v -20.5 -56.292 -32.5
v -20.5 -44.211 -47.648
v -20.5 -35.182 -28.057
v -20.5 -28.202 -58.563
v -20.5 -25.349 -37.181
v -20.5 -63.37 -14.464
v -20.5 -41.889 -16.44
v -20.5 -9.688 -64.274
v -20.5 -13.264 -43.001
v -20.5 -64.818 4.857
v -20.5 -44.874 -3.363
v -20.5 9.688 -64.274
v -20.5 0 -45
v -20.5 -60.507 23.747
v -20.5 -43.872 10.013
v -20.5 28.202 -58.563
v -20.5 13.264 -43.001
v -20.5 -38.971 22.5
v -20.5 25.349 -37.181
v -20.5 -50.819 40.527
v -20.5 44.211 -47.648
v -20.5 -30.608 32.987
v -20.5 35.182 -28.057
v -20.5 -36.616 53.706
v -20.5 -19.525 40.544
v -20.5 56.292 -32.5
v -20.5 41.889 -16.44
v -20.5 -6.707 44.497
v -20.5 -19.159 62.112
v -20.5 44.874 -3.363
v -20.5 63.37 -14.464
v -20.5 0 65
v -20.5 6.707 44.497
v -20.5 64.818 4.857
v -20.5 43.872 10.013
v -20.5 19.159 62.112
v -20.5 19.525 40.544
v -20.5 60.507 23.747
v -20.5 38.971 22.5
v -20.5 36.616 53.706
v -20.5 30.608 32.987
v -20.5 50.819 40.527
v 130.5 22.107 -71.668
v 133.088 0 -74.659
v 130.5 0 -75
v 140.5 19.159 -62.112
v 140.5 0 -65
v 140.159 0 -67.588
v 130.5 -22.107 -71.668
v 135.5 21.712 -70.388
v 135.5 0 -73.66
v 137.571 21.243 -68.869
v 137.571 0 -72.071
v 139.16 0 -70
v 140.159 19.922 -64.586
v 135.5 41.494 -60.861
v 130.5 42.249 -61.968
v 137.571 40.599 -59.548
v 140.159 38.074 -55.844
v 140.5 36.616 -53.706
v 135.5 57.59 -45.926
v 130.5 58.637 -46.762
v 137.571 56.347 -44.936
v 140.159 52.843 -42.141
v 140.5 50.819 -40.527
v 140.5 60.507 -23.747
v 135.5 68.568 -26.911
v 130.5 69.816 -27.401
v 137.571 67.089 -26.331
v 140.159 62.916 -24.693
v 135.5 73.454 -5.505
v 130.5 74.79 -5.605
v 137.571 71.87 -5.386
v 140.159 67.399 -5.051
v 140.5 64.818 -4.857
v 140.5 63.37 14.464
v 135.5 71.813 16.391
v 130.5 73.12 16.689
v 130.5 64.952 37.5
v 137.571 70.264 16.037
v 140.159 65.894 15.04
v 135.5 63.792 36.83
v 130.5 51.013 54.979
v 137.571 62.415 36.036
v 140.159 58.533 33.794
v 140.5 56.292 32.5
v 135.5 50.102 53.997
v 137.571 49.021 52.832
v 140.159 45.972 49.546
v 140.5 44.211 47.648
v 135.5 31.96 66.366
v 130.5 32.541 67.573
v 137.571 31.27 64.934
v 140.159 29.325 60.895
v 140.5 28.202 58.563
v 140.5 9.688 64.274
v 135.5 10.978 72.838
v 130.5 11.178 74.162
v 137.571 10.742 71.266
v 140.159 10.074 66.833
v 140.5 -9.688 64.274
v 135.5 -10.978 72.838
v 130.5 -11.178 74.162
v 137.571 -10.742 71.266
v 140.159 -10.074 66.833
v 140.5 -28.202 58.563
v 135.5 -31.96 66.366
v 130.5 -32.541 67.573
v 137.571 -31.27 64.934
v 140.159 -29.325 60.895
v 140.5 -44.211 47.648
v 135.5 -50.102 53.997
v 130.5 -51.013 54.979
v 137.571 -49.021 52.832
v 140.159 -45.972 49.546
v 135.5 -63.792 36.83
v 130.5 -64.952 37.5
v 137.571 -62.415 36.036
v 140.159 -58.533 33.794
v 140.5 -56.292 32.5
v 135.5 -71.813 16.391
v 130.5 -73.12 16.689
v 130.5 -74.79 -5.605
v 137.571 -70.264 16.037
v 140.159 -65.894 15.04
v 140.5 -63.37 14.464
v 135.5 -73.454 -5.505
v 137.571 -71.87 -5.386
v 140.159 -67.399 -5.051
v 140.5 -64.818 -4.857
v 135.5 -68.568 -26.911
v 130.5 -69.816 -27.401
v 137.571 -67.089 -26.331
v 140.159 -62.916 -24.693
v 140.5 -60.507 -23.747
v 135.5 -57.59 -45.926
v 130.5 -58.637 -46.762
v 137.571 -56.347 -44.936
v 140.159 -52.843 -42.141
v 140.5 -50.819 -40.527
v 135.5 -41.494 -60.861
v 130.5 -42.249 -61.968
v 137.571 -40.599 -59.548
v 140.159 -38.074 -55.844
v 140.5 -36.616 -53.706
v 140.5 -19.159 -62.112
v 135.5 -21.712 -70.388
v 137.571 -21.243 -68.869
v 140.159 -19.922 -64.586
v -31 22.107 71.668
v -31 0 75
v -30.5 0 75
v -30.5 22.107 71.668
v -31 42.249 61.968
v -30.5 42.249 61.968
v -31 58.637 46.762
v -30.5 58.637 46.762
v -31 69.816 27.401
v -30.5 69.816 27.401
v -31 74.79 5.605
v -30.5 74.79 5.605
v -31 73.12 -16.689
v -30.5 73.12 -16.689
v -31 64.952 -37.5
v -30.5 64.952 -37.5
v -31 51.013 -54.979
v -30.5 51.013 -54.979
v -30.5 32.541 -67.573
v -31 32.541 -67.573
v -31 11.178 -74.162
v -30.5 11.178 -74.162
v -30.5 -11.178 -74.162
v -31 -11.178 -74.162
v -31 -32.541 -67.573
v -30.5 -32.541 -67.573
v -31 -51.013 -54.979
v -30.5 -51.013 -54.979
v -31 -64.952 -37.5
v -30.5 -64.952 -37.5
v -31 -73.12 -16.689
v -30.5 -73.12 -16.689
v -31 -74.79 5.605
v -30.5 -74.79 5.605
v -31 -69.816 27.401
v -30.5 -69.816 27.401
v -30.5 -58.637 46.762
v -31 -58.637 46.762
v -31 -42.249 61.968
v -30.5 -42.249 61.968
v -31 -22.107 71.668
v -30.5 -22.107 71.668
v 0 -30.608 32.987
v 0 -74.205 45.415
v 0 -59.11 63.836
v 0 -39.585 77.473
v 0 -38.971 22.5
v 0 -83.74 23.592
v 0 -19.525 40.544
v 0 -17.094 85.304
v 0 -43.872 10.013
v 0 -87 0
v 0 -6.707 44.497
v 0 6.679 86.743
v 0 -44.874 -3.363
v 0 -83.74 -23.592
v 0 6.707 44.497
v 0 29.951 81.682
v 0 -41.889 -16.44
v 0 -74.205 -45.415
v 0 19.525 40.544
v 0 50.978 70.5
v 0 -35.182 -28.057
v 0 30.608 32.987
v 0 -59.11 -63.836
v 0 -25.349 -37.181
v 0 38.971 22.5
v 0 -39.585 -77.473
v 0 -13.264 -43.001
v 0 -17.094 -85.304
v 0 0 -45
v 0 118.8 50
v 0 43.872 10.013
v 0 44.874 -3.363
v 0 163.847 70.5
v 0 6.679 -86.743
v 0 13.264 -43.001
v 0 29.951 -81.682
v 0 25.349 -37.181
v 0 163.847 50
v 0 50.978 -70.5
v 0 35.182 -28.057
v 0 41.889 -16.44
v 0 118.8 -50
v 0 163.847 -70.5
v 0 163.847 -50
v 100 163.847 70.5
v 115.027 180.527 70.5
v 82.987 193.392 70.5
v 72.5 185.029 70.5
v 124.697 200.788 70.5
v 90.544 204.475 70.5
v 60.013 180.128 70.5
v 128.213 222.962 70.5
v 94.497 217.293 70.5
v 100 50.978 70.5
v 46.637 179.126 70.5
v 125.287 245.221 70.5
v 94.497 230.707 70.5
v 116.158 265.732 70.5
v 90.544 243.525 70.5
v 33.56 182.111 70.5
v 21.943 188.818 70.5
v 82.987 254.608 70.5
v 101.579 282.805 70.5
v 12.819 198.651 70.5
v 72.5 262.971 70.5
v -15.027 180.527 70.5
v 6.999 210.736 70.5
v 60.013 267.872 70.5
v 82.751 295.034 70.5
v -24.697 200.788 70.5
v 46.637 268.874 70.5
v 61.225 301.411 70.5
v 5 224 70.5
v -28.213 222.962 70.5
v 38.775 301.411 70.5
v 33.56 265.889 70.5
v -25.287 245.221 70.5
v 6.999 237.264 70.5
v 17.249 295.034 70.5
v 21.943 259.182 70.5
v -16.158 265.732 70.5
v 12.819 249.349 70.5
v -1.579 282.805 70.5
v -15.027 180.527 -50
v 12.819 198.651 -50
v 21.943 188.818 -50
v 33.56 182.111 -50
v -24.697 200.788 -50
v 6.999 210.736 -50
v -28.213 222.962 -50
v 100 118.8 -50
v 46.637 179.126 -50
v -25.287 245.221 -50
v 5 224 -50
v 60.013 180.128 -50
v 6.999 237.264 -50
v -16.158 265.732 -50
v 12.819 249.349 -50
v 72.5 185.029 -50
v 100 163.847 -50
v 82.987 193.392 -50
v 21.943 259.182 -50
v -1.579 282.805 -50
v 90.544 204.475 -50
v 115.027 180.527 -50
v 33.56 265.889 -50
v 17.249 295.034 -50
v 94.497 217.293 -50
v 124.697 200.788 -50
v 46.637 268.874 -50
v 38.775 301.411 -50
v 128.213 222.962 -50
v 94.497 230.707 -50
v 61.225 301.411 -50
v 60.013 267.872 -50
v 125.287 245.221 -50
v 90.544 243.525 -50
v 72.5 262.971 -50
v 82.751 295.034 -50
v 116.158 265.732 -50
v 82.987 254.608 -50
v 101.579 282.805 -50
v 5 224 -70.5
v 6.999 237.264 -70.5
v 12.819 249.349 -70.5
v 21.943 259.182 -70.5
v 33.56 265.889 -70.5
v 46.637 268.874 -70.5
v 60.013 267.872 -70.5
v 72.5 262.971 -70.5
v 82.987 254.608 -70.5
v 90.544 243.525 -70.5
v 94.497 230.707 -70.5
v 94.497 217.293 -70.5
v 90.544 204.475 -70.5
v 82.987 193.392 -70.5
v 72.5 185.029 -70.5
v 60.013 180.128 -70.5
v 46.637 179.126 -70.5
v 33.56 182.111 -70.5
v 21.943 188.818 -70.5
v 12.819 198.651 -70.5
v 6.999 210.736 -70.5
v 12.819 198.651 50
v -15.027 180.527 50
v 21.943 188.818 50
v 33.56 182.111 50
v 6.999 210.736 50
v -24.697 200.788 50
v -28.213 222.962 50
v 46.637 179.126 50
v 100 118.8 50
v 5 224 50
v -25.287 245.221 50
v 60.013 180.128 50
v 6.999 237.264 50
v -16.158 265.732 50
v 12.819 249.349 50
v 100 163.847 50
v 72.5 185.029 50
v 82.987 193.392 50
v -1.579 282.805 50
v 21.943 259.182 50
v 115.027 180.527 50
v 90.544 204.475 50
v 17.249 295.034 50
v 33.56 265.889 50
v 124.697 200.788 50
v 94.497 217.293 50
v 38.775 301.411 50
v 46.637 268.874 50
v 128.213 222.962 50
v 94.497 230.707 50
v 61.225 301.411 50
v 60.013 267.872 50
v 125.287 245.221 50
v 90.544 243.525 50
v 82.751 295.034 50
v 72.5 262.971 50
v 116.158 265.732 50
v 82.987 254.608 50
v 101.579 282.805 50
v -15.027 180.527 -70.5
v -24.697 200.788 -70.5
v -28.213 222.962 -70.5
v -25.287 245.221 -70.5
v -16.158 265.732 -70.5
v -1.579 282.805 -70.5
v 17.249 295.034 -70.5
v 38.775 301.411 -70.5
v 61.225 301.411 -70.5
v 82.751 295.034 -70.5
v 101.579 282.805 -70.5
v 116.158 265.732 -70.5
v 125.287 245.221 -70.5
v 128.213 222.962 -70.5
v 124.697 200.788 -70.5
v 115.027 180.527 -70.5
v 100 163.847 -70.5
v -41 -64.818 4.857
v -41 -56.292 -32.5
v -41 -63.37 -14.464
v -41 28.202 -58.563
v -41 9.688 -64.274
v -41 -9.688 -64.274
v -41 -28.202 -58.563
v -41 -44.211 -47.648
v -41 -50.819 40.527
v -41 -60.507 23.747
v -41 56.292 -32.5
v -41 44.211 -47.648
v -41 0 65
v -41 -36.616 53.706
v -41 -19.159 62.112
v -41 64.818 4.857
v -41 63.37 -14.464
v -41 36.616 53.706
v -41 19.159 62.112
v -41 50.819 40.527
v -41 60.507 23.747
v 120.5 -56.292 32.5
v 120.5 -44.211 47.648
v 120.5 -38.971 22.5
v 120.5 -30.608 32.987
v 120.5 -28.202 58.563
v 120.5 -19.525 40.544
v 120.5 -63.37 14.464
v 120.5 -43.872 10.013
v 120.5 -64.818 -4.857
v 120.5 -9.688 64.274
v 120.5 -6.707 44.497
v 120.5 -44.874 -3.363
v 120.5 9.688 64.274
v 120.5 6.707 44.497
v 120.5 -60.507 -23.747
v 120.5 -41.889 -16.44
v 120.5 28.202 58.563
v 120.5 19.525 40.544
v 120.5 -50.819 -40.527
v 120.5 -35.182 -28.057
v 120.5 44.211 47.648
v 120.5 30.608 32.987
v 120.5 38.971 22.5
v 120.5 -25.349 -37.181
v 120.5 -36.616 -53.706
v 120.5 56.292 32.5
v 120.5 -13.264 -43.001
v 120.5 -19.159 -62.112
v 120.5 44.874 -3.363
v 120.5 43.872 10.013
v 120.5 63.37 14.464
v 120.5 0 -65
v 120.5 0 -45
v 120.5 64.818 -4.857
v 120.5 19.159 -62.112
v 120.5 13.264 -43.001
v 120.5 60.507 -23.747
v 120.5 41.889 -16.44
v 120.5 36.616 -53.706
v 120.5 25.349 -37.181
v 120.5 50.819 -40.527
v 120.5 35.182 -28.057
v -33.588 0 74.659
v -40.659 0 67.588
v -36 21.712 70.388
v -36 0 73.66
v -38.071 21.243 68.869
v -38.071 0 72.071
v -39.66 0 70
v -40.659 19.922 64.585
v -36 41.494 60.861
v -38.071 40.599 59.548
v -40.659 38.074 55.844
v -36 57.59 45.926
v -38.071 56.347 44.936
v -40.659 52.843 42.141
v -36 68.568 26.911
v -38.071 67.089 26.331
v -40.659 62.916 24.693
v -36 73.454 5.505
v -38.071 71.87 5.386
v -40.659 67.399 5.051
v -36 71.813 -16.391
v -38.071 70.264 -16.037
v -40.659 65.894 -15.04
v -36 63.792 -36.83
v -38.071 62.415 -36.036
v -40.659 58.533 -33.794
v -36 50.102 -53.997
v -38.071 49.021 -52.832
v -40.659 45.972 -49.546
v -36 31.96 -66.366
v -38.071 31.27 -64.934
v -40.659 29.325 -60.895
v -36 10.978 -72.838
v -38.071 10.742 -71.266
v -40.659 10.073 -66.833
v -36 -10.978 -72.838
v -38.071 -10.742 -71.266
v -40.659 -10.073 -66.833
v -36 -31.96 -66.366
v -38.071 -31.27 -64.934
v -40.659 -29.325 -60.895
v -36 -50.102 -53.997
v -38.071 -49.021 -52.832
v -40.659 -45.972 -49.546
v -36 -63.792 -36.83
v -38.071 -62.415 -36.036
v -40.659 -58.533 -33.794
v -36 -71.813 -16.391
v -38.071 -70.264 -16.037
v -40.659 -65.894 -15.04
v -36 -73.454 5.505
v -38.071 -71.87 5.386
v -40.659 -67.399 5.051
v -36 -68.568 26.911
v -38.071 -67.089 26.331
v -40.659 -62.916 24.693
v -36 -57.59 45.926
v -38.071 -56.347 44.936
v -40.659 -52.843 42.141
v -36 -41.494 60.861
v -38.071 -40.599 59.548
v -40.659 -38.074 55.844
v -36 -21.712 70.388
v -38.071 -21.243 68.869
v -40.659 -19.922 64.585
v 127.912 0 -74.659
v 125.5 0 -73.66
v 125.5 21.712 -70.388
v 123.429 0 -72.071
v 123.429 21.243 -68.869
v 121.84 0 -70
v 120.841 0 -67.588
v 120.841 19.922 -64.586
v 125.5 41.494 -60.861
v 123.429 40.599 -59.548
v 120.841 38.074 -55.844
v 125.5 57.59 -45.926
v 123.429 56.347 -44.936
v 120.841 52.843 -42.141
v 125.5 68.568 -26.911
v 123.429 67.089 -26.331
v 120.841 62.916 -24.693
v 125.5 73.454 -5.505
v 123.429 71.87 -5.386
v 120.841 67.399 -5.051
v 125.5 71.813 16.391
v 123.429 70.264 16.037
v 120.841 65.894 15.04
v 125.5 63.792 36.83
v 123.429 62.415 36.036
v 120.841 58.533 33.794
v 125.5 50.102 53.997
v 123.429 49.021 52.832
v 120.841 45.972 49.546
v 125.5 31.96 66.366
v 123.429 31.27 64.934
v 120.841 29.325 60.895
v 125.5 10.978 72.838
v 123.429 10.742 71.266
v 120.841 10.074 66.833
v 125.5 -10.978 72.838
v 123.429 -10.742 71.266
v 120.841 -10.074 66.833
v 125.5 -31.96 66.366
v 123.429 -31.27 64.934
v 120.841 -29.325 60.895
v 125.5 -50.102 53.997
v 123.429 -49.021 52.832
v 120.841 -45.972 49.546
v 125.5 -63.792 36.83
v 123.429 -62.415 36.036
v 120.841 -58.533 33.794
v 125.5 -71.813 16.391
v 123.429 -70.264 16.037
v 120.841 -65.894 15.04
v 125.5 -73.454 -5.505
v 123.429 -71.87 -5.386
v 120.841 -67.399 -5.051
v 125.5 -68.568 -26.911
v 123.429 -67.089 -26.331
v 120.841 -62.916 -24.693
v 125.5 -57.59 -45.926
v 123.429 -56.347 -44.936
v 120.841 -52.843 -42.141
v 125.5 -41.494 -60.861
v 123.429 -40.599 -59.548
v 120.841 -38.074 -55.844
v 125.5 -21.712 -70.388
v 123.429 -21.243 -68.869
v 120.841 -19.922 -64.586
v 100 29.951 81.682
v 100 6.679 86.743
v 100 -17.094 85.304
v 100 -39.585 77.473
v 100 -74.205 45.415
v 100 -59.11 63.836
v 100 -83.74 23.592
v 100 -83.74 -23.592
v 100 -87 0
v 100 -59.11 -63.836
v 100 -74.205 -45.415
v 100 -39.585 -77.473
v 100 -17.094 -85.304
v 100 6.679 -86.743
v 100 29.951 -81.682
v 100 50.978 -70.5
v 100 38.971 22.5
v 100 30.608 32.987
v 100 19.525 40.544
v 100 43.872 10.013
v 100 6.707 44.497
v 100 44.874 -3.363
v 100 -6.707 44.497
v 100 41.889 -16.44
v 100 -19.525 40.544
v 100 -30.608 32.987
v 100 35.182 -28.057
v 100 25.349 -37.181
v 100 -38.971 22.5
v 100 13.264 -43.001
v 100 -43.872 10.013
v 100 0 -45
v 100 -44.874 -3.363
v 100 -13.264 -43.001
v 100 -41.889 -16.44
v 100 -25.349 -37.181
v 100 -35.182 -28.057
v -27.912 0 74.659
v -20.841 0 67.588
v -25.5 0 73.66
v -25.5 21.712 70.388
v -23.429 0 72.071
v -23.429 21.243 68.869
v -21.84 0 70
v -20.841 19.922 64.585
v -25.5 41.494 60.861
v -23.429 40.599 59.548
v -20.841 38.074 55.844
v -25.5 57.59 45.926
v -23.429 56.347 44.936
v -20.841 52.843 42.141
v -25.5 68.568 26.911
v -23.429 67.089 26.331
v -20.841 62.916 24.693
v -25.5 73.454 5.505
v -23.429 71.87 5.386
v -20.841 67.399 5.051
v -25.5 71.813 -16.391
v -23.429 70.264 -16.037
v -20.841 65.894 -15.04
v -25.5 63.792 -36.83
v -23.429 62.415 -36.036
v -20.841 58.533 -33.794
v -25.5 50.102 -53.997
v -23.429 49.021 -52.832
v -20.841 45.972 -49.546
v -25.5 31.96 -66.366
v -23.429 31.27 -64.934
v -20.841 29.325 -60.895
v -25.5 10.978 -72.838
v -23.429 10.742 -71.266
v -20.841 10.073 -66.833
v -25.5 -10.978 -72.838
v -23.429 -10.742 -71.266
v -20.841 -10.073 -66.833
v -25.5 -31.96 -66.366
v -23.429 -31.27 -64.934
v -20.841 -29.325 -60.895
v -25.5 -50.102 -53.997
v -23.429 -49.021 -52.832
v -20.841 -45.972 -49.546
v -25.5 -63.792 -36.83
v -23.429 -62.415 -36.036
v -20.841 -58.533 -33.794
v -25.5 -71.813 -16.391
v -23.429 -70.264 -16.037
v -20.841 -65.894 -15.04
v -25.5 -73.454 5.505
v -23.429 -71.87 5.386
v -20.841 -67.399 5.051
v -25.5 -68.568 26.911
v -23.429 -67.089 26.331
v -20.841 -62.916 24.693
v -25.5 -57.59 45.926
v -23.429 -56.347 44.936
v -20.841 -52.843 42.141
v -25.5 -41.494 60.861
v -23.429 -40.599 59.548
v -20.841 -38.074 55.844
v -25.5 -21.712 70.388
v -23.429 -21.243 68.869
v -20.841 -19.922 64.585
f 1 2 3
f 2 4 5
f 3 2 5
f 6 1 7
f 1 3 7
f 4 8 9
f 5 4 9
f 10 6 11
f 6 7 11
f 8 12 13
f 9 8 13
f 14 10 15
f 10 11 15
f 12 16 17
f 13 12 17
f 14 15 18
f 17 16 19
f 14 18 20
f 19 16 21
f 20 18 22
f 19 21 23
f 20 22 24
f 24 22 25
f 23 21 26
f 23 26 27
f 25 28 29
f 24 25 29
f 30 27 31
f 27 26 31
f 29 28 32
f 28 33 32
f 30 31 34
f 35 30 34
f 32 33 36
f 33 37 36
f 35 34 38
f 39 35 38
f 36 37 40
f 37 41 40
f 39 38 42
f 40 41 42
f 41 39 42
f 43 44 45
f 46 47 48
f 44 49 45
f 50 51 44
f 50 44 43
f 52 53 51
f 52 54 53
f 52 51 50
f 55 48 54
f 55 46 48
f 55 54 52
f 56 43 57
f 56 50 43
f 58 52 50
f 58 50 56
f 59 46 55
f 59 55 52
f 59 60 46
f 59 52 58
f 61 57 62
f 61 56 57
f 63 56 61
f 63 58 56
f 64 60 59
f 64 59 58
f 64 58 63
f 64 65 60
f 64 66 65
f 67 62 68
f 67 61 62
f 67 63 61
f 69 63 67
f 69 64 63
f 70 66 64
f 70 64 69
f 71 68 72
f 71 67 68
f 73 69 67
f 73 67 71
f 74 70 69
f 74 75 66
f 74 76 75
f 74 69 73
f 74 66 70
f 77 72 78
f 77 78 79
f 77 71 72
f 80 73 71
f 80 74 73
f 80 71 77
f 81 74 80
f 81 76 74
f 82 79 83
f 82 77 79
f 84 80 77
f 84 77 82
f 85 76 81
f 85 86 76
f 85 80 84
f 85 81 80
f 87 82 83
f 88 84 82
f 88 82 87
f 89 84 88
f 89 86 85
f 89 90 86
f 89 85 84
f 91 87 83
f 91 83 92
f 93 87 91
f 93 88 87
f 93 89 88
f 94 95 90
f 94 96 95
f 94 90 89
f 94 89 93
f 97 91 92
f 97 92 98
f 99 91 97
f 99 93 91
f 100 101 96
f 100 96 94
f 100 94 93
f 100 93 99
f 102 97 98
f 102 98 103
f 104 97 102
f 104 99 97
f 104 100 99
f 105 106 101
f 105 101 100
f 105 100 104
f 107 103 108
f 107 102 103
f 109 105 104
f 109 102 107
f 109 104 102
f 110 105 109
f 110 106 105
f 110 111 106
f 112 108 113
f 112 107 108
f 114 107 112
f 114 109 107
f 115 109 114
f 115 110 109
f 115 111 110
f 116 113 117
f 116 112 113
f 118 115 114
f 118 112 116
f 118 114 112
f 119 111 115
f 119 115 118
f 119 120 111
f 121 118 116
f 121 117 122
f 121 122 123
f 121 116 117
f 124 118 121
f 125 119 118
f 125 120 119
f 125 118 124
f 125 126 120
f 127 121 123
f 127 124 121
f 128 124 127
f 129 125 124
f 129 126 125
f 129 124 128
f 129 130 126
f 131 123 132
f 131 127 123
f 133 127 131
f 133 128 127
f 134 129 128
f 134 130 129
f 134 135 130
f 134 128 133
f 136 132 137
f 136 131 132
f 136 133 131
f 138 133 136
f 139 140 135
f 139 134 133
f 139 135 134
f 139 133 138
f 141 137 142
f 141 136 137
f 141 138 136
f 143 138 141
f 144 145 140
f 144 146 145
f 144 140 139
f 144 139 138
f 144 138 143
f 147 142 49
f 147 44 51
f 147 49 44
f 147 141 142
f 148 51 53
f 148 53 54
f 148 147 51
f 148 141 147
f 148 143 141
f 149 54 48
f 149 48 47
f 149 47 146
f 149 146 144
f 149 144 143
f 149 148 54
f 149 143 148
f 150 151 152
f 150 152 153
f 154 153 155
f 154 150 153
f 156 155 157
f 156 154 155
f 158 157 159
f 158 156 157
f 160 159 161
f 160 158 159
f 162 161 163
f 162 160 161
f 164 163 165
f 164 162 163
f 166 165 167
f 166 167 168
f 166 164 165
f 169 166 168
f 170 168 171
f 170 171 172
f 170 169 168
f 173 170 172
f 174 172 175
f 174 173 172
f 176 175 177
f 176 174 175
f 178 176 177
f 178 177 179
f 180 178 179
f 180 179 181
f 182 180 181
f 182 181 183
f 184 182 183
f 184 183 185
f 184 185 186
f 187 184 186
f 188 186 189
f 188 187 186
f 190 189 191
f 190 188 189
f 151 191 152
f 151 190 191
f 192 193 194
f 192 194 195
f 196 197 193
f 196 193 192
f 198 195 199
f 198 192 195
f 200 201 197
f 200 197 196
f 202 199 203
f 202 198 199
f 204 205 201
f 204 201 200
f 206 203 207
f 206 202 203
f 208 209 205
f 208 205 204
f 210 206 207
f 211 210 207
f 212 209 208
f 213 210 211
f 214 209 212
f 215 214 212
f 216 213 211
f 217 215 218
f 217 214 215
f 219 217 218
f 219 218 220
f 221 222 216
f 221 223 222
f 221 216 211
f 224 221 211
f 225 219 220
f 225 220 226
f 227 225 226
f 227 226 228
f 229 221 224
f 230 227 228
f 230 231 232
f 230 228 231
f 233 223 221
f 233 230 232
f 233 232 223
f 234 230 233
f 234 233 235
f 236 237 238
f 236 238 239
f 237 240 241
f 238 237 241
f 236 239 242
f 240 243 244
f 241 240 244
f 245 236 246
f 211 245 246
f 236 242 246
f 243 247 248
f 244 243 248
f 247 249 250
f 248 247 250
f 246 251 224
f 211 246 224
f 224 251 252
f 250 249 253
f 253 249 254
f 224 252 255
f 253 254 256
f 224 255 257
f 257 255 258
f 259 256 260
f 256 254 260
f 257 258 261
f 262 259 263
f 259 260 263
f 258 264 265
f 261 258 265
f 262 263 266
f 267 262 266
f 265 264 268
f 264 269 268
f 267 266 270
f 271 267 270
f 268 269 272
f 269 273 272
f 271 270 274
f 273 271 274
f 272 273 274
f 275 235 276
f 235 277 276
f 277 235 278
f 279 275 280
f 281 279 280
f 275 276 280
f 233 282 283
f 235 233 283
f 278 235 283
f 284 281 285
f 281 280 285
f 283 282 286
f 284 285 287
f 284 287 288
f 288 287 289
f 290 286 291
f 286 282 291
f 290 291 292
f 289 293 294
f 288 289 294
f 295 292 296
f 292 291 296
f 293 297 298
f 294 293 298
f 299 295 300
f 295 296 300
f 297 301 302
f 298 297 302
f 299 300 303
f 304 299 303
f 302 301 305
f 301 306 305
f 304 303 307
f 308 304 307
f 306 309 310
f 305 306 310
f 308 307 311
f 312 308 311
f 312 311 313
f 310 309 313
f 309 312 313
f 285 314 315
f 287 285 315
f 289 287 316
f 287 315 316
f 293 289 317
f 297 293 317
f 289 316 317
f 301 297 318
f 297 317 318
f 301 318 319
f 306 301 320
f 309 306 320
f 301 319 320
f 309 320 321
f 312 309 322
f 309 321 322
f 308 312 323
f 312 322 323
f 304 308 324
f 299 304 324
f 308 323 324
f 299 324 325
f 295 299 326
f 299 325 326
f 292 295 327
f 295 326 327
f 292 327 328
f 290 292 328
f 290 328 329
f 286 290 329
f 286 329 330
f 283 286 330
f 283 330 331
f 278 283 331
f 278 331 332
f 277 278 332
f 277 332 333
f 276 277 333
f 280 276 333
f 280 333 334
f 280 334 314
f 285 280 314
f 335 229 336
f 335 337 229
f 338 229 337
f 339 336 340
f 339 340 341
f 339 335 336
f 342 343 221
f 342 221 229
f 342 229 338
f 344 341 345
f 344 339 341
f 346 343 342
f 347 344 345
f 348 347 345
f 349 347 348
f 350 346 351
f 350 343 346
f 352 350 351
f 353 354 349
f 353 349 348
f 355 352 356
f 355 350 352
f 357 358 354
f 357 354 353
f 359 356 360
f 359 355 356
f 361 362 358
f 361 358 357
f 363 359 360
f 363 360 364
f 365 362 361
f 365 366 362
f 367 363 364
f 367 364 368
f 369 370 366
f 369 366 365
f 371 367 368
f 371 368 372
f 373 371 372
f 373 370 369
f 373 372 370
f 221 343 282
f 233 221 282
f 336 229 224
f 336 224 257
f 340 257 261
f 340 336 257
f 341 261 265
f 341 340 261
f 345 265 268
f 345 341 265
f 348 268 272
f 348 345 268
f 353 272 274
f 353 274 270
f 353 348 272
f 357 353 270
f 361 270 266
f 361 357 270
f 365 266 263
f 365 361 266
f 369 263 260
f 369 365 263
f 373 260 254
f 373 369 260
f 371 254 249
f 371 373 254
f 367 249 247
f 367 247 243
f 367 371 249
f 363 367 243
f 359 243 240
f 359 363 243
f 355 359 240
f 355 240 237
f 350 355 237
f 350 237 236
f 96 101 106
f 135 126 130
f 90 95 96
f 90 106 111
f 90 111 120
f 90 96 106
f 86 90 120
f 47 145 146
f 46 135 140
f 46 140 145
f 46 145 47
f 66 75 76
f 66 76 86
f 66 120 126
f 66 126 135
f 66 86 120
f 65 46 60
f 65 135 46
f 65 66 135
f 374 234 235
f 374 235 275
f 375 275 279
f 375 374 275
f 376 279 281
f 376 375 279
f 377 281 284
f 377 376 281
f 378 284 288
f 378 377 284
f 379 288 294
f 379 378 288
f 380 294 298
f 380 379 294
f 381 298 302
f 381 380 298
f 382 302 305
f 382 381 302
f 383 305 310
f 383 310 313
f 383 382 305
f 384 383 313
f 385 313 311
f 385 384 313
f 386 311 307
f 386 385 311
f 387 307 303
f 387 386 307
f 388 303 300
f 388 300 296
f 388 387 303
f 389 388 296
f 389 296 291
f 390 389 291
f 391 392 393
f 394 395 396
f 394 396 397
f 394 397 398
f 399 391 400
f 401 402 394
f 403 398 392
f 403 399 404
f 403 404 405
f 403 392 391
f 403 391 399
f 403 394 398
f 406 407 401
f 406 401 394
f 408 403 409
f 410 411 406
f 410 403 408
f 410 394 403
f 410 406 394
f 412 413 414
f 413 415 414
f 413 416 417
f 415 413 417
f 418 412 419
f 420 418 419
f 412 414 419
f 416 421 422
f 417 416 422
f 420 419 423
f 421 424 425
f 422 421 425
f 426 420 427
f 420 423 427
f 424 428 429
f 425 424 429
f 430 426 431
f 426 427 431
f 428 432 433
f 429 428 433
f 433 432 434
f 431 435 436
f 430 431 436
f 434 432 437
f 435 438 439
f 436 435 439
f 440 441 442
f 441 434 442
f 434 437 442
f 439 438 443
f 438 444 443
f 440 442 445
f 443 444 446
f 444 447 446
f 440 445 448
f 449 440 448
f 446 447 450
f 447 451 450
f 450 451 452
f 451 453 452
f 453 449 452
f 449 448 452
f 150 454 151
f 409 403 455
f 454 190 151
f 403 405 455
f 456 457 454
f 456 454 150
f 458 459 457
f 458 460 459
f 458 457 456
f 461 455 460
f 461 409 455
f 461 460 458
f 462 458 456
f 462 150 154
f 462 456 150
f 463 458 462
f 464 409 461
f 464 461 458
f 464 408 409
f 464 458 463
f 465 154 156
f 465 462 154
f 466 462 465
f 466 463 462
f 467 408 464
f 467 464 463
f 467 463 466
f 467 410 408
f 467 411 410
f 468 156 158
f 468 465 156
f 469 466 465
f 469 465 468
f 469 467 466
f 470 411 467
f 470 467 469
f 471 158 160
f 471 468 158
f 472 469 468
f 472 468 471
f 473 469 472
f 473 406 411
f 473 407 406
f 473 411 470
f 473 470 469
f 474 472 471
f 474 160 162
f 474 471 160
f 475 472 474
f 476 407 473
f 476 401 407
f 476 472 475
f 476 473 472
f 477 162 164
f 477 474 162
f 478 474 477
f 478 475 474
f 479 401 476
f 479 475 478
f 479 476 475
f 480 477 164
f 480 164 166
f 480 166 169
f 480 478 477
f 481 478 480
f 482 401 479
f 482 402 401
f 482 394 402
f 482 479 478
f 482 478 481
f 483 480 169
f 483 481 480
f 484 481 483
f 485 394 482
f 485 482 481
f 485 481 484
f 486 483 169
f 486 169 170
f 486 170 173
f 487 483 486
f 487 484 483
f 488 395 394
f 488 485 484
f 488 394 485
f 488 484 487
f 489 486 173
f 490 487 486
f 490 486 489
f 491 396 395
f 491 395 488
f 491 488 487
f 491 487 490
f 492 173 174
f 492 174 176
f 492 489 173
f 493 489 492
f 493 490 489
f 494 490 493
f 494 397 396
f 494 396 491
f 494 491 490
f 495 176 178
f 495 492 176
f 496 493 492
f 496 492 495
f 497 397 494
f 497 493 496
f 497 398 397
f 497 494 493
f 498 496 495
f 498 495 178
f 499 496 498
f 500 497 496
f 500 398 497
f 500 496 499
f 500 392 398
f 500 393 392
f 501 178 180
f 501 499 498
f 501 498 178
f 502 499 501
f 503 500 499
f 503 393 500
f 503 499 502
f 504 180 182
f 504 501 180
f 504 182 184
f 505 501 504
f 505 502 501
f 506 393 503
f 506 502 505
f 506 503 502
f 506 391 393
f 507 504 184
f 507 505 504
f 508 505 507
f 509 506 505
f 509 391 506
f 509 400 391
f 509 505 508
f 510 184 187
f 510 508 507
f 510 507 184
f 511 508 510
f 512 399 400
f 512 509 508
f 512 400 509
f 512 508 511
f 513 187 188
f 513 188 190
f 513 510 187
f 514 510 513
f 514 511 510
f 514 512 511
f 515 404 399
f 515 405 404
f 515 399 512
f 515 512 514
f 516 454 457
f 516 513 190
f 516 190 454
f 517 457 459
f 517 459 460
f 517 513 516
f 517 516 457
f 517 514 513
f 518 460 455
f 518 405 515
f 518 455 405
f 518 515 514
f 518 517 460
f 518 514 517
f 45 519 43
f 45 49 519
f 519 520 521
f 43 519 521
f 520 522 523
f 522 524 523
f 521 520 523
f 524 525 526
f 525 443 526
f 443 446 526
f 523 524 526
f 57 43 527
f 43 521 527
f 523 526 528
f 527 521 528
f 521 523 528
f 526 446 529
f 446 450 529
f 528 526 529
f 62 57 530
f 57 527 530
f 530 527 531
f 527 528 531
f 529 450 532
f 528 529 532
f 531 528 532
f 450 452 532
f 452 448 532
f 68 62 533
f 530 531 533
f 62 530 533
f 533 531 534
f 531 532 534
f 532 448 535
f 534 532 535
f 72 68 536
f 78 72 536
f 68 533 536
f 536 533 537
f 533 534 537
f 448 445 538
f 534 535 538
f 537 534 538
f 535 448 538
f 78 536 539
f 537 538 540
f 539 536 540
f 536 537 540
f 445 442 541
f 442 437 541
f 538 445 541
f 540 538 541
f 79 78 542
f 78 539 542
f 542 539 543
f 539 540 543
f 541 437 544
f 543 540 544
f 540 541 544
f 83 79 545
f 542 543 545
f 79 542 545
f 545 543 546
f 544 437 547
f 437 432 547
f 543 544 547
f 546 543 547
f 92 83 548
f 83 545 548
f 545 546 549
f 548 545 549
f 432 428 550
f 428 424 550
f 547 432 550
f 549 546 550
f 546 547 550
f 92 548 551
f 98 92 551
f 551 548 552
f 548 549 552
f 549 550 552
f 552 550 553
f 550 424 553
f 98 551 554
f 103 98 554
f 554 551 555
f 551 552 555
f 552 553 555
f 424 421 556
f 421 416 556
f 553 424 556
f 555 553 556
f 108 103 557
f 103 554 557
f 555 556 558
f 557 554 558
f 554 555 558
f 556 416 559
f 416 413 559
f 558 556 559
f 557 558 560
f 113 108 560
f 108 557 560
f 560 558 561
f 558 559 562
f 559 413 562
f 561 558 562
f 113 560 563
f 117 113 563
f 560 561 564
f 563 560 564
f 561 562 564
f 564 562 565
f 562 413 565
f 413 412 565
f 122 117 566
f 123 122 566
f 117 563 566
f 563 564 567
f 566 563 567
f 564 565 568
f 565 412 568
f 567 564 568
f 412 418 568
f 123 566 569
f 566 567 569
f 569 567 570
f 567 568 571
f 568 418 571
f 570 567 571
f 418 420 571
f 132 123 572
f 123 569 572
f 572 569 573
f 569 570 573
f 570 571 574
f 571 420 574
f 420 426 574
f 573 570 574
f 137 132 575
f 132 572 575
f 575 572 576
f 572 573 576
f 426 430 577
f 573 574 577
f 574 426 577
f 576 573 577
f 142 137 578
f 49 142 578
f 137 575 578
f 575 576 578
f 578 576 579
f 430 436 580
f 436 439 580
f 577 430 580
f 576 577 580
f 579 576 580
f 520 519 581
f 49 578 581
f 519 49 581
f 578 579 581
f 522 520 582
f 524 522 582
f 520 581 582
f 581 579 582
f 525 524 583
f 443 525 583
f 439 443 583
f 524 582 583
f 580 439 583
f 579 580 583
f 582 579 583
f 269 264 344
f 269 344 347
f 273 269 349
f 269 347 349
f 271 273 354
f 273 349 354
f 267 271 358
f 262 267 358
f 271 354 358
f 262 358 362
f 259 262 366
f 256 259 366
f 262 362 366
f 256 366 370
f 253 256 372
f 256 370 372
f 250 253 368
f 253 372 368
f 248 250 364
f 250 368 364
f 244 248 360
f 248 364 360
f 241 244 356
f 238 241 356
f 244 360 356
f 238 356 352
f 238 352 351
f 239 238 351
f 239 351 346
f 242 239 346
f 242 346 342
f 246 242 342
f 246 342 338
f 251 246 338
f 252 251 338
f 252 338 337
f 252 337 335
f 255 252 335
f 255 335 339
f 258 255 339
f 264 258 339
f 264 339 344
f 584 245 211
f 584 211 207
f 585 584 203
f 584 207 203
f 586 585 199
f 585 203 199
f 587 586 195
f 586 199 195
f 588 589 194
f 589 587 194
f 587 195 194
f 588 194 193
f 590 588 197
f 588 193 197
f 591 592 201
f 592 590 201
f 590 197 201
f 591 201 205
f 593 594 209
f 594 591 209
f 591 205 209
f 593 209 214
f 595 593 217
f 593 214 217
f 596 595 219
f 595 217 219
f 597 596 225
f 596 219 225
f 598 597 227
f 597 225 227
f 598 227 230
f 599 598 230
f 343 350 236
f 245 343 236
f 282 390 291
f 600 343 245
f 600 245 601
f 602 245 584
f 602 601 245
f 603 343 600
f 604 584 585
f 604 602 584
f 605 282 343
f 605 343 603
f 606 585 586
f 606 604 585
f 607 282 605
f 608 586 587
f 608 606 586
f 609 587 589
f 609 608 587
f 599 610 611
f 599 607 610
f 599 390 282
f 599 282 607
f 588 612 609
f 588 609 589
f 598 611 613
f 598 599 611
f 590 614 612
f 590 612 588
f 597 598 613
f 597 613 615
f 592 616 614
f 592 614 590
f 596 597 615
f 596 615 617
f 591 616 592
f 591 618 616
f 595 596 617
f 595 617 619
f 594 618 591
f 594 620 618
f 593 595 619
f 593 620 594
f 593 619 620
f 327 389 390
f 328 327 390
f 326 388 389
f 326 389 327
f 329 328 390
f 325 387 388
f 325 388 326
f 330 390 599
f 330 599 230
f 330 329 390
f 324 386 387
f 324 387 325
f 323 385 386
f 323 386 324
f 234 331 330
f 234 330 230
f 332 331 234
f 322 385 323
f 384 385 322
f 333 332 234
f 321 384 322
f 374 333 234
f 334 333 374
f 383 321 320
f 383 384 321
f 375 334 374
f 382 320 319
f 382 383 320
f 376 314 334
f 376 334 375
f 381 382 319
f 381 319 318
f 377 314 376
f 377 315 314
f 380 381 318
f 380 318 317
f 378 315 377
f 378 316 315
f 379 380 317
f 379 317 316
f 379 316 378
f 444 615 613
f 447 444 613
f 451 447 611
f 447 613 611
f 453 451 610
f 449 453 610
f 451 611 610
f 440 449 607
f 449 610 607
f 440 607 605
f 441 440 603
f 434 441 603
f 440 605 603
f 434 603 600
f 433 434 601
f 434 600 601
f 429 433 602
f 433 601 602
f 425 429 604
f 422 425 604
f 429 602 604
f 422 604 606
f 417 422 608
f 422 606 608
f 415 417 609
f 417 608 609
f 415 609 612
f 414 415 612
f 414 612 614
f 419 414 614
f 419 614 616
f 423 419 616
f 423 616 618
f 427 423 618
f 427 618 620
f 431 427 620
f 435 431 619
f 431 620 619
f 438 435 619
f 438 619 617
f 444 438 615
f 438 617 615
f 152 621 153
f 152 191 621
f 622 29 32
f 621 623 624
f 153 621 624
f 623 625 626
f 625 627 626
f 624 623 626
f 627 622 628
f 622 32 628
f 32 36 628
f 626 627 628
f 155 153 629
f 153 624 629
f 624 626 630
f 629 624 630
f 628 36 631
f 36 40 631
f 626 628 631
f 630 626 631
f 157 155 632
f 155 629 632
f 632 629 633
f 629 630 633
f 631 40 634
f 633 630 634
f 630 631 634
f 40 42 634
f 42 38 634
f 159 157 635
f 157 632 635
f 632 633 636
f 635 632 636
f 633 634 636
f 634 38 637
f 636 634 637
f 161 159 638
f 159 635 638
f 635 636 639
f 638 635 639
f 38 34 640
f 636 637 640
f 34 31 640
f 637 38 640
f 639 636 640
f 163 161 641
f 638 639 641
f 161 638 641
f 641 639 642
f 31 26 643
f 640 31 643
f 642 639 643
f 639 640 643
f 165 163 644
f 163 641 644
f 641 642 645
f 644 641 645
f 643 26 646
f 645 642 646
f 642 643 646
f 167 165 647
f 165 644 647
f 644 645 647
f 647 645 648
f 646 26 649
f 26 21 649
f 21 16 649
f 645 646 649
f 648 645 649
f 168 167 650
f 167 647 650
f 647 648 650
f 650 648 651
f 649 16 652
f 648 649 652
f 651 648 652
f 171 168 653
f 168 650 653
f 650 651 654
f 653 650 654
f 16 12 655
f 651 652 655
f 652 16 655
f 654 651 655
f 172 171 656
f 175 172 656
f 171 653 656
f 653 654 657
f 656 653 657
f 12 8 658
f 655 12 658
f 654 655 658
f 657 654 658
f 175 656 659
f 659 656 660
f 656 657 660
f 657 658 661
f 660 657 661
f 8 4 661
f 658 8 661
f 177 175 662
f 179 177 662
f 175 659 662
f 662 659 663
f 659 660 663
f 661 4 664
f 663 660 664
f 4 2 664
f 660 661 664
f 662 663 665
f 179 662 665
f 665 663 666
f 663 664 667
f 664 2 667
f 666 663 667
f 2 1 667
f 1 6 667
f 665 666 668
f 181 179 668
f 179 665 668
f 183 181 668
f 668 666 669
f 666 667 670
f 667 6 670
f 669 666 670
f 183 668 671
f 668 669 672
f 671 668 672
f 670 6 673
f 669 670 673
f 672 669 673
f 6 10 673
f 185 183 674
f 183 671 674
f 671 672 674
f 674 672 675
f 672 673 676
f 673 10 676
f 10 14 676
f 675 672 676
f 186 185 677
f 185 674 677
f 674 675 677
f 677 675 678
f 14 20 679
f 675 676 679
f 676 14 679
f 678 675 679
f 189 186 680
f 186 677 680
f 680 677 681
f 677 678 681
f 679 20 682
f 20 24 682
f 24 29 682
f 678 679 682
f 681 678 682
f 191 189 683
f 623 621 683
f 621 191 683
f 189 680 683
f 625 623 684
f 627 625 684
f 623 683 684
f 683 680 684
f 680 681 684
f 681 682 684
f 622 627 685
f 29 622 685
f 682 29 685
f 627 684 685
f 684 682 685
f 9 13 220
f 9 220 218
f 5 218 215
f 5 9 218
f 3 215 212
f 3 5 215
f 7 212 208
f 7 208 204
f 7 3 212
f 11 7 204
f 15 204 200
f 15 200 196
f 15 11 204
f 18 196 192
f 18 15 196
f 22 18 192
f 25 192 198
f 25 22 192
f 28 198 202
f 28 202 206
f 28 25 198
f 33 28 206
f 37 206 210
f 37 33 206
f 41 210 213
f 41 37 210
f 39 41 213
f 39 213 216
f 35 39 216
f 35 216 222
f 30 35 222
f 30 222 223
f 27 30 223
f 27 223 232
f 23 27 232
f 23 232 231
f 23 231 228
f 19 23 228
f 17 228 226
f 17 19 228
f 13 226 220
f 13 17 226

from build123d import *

# Parameters (mm, degrees)
SKETCH1_R                = 87
BOSS_EXTRUDE3_DEPTH      = 100
SKETCH2_R                = 45
BOSS_EXTRUDE4_DEPTH      = 20.5
SKETCH3_R                = 75
BOSS_EXTRUDE5_DEPTH      = 20
FILLET1_R                = 10
BOSS_EXTRUDE6_START      = 20.5
SKETCH4_R                = 45
BOSS_EXTRUDE6_DEPTH      = 20.5
BOSS_EXTRUDE7_START      = 20.5
SKETCH5_R                = 75
BOSS_EXTRUDE7_DEPTH      = 20.5
FILLET2_R                = 10
BOSS_EXTRUDE8_REACH      = 241.969
BOSS_EXTRUDE8_END_RADIUS = 87
SKETCH6_W                = 100
SKETCH6_H                = 141
SKETCH9_R                = 45
BOSS_EXTRUDE10_DEPTH     = 141
CUT_EXTRUDE2_DEPTH       = 367.4016204
CUT_EXTRUDE2_DEPTH_BACK  = 367.4016204
SKETCH21_W               = 216.769628827
SKETCH21_H               = 100


with BuildPart() as part:
    # Sketch1 → Boss-Extrude3 (new body)
    with BuildSketch(Plane(origin=(0, 0, 0), x_dir=(0, 0, -1), z_dir=(1, 0, 0))):
        Circle(SKETCH1_R)
    extrude(amount=BOSS_EXTRUDE3_DEPTH)

    # Sketch2 → Boss-Extrude4 (add)
    with BuildSketch(Plane(origin=(100, 0, 0), x_dir=(0, 0, -1), z_dir=(1, 0, 0))):
        Circle(SKETCH2_R)
    extrude(amount=BOSS_EXTRUDE4_DEPTH)

    # Sketch3 → Boss-Extrude5 (add)
    with BuildSketch(Plane(origin=(120.5, 0, 0), x_dir=(0, 0, -1), z_dir=(1, 0, 0))):
        Circle(SKETCH3_R)
    extrude(amount=BOSS_EXTRUDE5_DEPTH)

    # Fillet1
    fillet1_edges = [part.edges().sort_by_distance(p)[0] for p in [
        (140.5, 0, 75),
        (120.5, 0, 75),
    ]]
    fillet(fillet1_edges, radius=FILLET1_R - 0.0001)  # a hair under: the kernel refuses the full size

    # Sketch4 → Boss-Extrude6 (add)
    with BuildSketch(Plane.ZY.offset(BOSS_EXTRUDE6_START)):
        with Locations(Location((0, 0, 0), (0, 0, 180))):
            Circle(SKETCH4_R)
    extrude(amount=-BOSS_EXTRUDE6_DEPTH)

    # Sketch5 → Boss-Extrude7 (add)
    with BuildSketch(Plane.ZY.offset(20.5).offset(BOSS_EXTRUDE7_START)):
        Circle(SKETCH5_R)
    extrude(amount=-BOSS_EXTRUDE7_DEPTH)

    # Fillet2
    fillet2_edges = [part.edges().sort_by_distance(p)[0] for p in [
        (-20.5, 0, -75),
        (-41, 0, -75),
    ]]
    fillet(fillet2_edges, radius=FILLET2_R)

    # Boss-Extrude8: up to this cylinder (the profile starts outside it)
    boss_extrude8_end = Plane(origin=(50, 0, 0), z_dir=(-1, 0, 0)) * Cylinder(BOSS_EXTRUDE8_END_RADIUS, 658.938, mode=Mode.PRIVATE)
    # Sketch6 → Boss-Extrude8 (add, up to the surface)
    with BuildSketch(Plane(origin=(0, 87, 0), x_dir=(1, 0, 0), z_dir=(0, 1, 0)), mode=Mode.PRIVATE) as boss_extrude8_sk1:
        with Locations((50, 0)):
            Rectangle(SKETCH6_W, SKETCH6_H)
    boss_extrude8_tool1 = extrude(boss_extrude8_sk1.sketch, amount=-BOSS_EXTRUDE8_REACH, mode=Mode.PRIVATE) - boss_extrude8_end
    add(boss_extrude8_tool1.solids().sort_by_distance((50, 87, 0))[0])
    add(boss_extrude8_tool1.solids().sort_by_distance((50, 87, 0))[1])

    # Sketch9 → Boss-Extrude10 (add)
    with BuildSketch(Plane(origin=(0, 0, -70.5), x_dir=(-1, 0, 0), z_dir=(0, 0, -1))):
        with BuildLine():
            Line((-100, 87), (0, 87))
            Line((0, 87), (0, 163.846653629))
            ThreePointArc((0, 163.846653629), (-50, 302.220362308), (-100, 163.846653629))
            Line((-100, 163.846653629), (-100, 87))
        make_face()
        with Locations((-50, 224)):
            Circle(SKETCH9_R, mode=Mode.SUBTRACT)
    extrude(amount=-BOSS_EXTRUDE10_DEPTH)

    # Sketch21 → Cut-Extrude2 (cut, two sides: drawn at the far end of the back side and taken through both)
    with BuildSketch(Plane(origin=(147, 0, 0), x_dir=(0, 1, 0), z_dir=(-1, 0, 0)).offset(-CUT_EXTRUDE2_DEPTH_BACK)):
        with Locations((227.184814414, 0)):
            Rectangle(SKETCH21_W, SKETCH21_H)
    extrude(amount=CUT_EXTRUDE2_DEPTH + CUT_EXTRUDE2_DEPTH_BACK, mode=Mode.SUBTRACT)


solid = part.part
